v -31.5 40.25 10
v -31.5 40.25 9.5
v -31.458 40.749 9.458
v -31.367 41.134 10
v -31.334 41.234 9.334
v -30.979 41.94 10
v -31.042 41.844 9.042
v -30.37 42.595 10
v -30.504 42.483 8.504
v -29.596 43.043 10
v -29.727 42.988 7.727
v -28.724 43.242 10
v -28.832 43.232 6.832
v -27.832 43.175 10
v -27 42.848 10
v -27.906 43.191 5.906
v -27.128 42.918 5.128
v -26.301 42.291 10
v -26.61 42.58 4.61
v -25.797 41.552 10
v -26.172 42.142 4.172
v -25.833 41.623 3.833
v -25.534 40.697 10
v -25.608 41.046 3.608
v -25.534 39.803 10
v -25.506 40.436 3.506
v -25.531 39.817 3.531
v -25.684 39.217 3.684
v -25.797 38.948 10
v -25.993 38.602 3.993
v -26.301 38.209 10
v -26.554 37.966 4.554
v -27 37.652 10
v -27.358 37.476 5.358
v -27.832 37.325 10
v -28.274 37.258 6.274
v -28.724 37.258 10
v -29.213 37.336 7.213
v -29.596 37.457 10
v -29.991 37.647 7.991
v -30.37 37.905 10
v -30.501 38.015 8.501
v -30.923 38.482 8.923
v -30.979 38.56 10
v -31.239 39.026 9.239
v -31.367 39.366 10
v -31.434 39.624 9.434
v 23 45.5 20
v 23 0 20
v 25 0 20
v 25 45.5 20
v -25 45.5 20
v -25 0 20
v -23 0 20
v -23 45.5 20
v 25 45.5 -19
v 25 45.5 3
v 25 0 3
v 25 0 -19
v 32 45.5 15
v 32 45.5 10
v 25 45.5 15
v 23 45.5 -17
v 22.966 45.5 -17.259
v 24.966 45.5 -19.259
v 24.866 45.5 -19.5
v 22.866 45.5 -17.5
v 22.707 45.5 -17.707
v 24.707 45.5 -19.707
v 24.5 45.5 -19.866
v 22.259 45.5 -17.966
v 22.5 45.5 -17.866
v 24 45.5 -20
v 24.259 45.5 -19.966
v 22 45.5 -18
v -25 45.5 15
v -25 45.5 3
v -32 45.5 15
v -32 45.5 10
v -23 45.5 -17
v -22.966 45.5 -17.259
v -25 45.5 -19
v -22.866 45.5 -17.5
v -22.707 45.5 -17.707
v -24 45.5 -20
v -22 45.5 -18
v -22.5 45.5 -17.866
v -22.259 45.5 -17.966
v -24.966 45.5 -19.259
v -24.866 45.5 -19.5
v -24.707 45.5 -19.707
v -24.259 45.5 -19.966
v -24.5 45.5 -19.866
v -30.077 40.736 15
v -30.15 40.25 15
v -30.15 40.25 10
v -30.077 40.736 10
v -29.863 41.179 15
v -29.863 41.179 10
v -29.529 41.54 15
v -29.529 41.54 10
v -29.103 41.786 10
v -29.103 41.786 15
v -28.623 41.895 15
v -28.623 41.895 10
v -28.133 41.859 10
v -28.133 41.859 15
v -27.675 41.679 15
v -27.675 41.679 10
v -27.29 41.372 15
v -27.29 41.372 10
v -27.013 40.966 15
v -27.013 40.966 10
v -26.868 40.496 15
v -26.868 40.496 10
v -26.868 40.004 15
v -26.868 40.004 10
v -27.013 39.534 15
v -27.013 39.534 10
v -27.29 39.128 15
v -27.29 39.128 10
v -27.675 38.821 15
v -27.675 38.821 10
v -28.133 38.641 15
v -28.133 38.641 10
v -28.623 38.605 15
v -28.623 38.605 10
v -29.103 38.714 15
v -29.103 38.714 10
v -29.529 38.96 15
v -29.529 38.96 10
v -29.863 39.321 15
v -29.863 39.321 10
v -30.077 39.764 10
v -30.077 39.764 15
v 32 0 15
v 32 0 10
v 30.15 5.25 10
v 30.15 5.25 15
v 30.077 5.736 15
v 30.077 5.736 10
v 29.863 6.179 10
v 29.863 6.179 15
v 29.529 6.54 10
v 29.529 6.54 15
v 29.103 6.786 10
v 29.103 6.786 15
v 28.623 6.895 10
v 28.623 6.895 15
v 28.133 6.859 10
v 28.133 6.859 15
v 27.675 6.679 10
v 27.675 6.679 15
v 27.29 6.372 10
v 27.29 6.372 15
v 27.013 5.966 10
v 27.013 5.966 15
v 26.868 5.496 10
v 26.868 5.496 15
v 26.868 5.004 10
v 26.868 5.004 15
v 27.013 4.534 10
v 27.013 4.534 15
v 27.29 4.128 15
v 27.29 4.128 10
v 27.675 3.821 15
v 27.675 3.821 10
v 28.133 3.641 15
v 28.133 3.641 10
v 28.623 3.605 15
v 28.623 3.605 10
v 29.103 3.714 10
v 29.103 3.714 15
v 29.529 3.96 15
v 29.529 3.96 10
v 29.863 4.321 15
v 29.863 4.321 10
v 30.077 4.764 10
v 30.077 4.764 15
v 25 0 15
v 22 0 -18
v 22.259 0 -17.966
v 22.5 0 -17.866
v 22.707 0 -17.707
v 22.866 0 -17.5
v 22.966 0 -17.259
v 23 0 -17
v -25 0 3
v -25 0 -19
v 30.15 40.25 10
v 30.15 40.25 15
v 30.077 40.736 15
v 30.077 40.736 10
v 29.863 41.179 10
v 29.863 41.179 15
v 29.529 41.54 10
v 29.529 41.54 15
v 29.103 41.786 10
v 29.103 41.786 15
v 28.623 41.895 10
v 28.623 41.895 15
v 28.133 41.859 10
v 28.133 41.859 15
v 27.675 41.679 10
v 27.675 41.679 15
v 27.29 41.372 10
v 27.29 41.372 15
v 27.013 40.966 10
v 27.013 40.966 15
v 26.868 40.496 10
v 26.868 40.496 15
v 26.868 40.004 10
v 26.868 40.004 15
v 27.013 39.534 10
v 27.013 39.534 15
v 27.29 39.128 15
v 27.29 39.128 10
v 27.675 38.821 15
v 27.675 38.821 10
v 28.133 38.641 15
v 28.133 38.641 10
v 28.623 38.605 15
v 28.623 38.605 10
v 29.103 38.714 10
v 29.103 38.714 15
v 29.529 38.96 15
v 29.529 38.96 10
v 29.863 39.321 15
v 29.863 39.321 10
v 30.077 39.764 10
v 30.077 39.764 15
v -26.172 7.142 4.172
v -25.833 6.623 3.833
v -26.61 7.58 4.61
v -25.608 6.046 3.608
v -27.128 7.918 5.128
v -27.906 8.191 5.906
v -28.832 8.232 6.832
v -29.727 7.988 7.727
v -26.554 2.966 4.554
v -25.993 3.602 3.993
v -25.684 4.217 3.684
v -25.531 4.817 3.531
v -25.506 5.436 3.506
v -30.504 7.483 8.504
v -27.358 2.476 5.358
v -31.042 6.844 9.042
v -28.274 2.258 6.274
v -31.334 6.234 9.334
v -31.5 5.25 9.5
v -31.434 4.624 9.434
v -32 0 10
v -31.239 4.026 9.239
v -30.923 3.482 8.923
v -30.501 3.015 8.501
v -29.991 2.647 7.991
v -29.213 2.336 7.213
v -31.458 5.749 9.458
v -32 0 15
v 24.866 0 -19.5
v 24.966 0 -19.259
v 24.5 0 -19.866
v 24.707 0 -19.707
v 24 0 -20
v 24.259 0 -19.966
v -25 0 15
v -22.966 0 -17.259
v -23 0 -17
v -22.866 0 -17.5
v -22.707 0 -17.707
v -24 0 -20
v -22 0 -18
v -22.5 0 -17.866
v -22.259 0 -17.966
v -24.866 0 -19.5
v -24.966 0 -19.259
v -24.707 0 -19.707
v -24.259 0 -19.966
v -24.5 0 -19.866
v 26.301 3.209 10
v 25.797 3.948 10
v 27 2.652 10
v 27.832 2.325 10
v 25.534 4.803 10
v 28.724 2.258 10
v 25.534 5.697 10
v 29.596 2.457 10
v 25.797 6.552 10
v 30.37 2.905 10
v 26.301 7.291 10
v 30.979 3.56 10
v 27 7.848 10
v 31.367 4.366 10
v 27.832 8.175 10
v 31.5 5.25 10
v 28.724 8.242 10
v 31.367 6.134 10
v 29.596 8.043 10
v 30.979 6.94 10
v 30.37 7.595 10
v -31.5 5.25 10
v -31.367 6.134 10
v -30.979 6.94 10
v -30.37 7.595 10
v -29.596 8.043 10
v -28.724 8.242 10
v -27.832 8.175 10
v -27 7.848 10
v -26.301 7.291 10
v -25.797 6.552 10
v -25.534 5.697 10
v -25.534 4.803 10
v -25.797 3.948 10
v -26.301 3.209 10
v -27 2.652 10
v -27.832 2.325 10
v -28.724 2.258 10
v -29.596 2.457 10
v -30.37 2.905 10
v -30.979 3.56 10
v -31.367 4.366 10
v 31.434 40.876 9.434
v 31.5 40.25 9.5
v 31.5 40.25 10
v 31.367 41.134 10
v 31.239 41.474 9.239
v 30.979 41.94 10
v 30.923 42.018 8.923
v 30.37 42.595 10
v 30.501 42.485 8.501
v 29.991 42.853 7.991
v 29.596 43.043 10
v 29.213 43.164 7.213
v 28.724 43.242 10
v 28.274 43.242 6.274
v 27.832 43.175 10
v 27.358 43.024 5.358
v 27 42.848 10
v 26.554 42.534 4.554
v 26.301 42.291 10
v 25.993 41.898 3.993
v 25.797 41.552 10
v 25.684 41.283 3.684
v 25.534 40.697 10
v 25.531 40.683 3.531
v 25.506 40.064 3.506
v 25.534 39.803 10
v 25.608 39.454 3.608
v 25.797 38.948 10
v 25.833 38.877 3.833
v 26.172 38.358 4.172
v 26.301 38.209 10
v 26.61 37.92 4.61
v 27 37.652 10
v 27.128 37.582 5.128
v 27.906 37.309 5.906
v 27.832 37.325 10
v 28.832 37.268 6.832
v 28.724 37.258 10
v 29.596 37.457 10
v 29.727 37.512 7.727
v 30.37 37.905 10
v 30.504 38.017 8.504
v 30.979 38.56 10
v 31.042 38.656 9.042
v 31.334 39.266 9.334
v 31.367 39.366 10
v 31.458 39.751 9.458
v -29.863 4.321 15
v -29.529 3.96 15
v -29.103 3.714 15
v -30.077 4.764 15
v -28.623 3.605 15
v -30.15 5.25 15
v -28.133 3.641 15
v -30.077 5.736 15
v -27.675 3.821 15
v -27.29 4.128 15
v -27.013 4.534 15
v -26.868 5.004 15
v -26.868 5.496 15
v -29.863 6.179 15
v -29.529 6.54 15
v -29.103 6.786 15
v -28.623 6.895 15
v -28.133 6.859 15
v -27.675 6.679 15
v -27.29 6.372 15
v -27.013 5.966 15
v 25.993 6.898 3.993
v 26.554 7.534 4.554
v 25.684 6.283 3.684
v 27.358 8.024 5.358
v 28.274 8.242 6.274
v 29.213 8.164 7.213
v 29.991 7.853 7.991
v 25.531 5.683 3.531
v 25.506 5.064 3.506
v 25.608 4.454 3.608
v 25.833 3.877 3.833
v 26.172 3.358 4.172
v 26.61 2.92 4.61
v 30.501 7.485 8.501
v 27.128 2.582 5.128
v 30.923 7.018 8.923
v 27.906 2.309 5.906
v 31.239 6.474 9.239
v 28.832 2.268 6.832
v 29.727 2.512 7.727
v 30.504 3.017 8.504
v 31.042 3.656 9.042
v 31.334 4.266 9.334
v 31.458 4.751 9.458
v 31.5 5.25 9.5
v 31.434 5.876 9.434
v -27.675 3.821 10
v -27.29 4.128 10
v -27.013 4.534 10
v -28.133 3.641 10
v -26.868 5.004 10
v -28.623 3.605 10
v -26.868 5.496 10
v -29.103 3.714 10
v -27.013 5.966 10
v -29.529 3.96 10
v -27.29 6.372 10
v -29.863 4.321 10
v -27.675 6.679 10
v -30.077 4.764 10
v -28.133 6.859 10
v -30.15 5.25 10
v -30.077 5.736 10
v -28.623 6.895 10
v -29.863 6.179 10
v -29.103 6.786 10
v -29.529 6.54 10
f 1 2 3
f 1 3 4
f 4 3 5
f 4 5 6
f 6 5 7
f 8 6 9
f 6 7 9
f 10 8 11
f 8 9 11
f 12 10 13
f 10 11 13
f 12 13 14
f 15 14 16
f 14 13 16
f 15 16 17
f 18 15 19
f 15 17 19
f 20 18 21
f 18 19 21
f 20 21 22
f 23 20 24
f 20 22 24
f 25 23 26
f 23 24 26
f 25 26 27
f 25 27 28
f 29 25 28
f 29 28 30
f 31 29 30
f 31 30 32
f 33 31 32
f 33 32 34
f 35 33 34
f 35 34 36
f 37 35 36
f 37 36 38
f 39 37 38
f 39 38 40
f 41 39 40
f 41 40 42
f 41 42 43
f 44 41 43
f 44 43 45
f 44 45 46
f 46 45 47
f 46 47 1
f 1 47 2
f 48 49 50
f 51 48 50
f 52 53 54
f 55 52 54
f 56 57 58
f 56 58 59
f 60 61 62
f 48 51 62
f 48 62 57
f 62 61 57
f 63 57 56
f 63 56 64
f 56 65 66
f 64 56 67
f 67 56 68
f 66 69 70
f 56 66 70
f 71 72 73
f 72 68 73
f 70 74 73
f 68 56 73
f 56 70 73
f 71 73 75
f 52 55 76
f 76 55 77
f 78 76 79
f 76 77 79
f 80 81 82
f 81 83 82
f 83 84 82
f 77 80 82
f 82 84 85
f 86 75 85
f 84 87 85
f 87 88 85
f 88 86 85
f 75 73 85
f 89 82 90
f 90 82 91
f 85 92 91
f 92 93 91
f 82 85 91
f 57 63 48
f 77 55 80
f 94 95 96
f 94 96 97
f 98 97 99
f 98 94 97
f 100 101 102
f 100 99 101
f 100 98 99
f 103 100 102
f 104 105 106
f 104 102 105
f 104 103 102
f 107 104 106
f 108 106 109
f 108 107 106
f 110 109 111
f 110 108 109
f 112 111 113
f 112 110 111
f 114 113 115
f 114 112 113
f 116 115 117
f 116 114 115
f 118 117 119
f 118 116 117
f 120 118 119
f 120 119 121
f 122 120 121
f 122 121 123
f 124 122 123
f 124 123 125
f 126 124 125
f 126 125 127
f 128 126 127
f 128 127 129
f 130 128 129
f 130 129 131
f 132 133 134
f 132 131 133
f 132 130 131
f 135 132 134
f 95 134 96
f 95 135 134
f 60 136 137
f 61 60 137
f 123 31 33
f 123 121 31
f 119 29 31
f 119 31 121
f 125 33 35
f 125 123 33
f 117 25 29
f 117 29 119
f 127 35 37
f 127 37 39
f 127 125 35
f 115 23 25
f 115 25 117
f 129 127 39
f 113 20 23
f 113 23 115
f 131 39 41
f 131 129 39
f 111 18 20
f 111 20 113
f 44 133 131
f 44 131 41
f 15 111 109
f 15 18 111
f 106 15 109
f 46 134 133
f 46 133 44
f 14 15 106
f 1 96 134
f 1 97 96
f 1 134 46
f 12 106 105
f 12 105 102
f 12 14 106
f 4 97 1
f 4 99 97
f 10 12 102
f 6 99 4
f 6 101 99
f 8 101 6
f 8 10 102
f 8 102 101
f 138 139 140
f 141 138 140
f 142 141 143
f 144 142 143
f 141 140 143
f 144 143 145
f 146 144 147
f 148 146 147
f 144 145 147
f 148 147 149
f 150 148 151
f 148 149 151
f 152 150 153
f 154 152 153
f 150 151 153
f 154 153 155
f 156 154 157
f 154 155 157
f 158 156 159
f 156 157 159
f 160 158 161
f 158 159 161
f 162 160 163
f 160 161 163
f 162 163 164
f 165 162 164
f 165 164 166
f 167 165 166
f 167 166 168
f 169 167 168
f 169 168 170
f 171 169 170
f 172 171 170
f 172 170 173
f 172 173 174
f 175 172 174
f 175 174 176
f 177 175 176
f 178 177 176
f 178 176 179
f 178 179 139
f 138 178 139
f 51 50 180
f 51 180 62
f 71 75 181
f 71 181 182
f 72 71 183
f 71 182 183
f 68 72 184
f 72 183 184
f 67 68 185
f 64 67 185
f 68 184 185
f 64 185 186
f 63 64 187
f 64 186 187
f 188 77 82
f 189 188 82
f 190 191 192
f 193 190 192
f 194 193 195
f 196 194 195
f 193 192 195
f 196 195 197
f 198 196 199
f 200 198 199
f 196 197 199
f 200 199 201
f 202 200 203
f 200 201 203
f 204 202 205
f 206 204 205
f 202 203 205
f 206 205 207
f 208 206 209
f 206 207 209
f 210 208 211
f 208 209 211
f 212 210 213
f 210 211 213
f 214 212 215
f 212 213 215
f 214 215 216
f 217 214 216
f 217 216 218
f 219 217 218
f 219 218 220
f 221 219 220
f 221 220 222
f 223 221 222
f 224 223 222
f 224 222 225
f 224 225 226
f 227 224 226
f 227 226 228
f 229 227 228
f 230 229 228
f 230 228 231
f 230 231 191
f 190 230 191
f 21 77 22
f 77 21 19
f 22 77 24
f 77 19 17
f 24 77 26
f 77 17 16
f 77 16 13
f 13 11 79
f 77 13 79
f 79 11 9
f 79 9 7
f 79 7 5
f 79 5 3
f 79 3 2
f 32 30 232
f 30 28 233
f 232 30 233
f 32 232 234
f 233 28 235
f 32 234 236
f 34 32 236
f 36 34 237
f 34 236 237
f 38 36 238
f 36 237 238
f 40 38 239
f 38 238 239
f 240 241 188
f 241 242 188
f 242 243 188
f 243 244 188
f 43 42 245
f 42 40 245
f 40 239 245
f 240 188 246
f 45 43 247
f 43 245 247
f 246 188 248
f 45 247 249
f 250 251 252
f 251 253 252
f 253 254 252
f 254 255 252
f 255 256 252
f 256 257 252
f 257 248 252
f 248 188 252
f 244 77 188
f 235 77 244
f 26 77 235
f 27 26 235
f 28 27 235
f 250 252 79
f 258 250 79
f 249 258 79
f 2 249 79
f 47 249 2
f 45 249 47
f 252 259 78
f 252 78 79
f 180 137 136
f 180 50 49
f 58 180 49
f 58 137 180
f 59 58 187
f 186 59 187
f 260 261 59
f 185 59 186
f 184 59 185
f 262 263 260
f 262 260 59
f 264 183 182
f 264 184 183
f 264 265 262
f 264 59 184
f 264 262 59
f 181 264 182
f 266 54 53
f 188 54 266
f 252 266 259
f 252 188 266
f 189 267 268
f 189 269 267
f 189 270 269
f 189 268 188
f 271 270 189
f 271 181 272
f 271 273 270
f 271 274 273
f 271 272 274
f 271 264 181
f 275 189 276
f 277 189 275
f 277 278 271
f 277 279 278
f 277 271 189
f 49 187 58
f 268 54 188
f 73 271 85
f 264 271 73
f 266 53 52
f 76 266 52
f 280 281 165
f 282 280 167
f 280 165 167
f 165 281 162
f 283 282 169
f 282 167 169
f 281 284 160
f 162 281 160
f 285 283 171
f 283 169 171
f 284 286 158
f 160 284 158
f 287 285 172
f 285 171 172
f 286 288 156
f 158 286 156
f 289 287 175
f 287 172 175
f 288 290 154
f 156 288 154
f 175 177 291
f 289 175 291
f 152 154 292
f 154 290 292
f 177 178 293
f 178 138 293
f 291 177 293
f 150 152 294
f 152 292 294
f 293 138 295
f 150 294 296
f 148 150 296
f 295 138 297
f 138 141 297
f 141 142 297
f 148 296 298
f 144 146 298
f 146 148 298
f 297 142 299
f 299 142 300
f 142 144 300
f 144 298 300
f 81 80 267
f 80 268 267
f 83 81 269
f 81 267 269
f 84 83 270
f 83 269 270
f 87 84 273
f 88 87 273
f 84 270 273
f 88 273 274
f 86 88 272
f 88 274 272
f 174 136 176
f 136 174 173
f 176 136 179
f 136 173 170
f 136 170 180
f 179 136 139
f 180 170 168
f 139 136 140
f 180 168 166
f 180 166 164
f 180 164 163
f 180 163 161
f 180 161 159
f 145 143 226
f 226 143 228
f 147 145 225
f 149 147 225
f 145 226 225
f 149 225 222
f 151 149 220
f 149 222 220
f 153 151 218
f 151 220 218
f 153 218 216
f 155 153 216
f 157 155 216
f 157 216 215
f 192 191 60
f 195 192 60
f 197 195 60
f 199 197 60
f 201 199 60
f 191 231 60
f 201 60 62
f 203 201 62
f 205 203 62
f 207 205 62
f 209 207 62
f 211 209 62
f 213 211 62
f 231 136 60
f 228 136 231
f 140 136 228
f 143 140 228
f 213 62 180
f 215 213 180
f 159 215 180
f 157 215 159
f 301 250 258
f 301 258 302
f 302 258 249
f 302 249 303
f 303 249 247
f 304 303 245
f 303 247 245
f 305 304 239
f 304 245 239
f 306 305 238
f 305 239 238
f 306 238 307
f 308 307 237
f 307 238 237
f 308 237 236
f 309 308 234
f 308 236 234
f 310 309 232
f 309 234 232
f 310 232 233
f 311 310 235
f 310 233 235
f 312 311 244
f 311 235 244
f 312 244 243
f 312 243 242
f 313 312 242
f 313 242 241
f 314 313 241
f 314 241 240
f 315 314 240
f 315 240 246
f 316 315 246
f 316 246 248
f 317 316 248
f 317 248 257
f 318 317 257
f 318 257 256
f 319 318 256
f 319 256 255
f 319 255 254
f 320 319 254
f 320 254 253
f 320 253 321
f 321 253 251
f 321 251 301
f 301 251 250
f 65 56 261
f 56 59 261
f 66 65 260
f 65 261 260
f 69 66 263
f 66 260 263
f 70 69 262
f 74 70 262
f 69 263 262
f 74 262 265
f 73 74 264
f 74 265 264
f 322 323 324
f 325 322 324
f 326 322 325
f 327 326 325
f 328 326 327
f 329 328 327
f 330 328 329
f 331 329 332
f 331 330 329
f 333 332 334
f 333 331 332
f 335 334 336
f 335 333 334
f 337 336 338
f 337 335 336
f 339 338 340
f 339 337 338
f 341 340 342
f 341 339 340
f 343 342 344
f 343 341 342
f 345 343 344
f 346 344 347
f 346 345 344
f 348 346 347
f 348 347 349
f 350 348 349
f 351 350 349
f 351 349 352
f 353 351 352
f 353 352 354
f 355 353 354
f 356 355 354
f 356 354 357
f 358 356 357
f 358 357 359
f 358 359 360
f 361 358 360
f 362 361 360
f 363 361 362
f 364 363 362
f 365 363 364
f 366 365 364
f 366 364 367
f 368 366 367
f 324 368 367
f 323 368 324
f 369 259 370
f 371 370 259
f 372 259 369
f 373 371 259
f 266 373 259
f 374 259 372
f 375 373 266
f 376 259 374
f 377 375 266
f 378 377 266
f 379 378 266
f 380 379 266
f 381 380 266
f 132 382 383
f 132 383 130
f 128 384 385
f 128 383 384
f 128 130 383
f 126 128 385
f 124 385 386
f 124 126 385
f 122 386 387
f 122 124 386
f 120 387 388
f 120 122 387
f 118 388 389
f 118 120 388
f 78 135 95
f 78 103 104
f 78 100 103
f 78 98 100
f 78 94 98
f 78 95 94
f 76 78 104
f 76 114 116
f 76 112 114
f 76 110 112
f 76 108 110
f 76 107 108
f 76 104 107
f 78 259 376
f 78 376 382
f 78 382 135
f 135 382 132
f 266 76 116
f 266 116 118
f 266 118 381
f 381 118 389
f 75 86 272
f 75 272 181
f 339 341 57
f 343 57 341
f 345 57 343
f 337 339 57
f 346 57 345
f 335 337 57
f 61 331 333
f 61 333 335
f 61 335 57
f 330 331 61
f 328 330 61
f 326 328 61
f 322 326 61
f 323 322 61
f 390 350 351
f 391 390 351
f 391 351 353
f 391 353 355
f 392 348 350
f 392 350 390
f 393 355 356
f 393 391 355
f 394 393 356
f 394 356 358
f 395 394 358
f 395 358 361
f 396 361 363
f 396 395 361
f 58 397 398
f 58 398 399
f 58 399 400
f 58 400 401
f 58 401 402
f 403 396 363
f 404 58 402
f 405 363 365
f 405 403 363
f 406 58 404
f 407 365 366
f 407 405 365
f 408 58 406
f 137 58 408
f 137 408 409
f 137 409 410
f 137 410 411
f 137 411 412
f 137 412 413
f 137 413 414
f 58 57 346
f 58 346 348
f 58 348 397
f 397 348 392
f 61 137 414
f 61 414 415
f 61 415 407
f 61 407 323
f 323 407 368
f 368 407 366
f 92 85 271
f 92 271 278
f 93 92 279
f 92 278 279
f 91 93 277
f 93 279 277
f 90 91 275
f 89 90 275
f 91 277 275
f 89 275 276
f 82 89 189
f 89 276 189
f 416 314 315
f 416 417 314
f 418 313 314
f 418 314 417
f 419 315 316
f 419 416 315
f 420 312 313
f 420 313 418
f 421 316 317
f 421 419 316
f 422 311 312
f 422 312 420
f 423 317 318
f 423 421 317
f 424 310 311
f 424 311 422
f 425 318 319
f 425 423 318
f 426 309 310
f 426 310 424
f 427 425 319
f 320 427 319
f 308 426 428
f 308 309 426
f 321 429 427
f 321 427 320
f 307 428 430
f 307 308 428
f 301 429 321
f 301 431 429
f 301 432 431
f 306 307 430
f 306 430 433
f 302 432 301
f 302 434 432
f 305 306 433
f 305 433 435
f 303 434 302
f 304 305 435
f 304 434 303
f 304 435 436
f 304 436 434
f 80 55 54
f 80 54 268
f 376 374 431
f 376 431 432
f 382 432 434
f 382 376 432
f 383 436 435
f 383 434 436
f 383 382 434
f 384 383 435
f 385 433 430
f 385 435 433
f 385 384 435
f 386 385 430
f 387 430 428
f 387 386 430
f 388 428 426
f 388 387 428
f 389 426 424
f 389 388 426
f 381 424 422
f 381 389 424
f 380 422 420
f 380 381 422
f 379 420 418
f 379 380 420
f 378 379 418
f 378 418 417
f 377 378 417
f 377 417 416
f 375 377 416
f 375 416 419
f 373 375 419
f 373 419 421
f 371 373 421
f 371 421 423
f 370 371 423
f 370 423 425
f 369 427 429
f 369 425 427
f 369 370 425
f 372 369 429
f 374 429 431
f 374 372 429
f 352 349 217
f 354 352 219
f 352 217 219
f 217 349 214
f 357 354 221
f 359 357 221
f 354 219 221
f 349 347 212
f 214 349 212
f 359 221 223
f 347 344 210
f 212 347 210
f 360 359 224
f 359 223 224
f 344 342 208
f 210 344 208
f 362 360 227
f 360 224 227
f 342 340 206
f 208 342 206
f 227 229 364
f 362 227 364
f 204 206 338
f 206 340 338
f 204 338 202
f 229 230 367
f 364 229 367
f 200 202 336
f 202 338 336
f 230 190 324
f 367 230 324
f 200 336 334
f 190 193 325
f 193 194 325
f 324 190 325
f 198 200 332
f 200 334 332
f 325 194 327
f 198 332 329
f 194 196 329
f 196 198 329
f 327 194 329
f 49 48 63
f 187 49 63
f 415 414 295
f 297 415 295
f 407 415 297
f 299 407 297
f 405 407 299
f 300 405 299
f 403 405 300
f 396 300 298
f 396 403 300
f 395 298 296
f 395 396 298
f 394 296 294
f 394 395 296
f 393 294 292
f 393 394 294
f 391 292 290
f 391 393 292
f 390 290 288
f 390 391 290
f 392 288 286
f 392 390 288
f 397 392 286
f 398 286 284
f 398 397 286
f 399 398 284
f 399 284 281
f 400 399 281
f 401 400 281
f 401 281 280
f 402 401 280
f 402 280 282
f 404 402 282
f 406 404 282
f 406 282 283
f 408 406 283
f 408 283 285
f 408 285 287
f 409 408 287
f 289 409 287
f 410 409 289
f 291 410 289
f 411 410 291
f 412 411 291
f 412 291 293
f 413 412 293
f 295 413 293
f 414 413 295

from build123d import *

# Parameters (mm, degrees)
SKETCH_1_W          = 64
SKETCH_1_H          = 40
EXTRUDE_1_DEPTH     = 45.5
CUT_EXTRUDE_1_REACH = 61.112
SKETCH_2_W          = 46
SKETCH_2_H          = 38
CUT_EXTRUDE_2_REACH = 61.112
SKETCH_3_W          = 7
SKETCH_3_H          = 30
EXTRUDE_2_DEPTH     = 45.5
CUT_EXTRUDE_3_REACH = 70.515
SKETCH_4_R          = 1.65
SKETCH_7_R          = 3
CUT_EXTRUDE_4_DEPTH = 30
SKETCH_8_W          = 7
SKETCH_8_H          = 45.5
CUT_EXTRUDE_5_DEPTH = 5
FILLET_1_R          = 1


with BuildPart() as part:
    # 草图1 → 凸台-拉伸1 (new body)
    with BuildSketch(Plane(origin=(0, 0, 0), x_dir=(1, 0, 0), z_dir=(0, 1, 0))):
        Rectangle(SKETCH_1_W, SKETCH_1_H)
    extrude(amount=EXTRUDE_1_DEPTH)

    # 草图2 → 切除-拉伸1 (cut, up to next)
    with BuildSketch(Plane(origin=(0, 45.5, 0), x_dir=(1, 0, 0), z_dir=(0, 1, 0)), mode=Mode.PRIVATE) as cut_extrude_1_sk1:
        with Locations((0, -1)):
            Rectangle(SKETCH_2_W, SKETCH_2_H)
    cut_extrude_1_tool1 = extrude(cut_extrude_1_sk1.sketch, amount=-CUT_EXTRUDE_1_REACH, mode=Mode.PRIVATE) & part.part
    add(cut_extrude_1_tool1.solids().sort_by_distance((0, 45.5, 1))[0], mode=Mode.SUBTRACT)

    # 草图3 → 切除-拉伸2 (cut, up to next)
    with BuildSketch(Plane(origin=(0, 45.5, 0), x_dir=(1, 0, 0), z_dir=(0, 1, 0)), mode=Mode.PRIVATE) as cut_extrude_2_sk1:
        with Locations((-28.5, 5)):
            Rectangle(SKETCH_3_W, SKETCH_3_H)
    cut_extrude_2_tool1 = extrude(cut_extrude_2_sk1.sketch, amount=-CUT_EXTRUDE_2_REACH, mode=Mode.PRIVATE) & part.part
    cut_extrude_2 = cut_extrude_2_tool1.solids().sort_by_distance((-28.5, 45.5, -5))[0]
    add(cut_extrude_2, mode=Mode.SUBTRACT)

    # 草图6 → 凸台-拉伸2 (add)
    with BuildSketch(Plane(origin=(0, 0, 0), x_dir=(1, 0, 0), z_dir=(0, 1, 0))):
        Polygon((-32, -10), (-25, -10), (-25, -3), align=None)
    extrude_2 = extrude(amount=EXTRUDE_2_DEPTH)

    # 切除-拉伸3: up to this plane
    cut_extrude_3_end = Plane(origin=(-25, 55.399494937, 3), z_dir=(0.7071067811865438, 0, 0.7071067811865512))
    # 草图4 → 切除-拉伸3 (cut, up to the surface)
    with BuildSketch(Plane(origin=(0, 0, 20), x_dir=(-1, 0, 0), z_dir=(0, 0, -1)), mode=Mode.PRIVATE) as cut_extrude_3_sk1:
        with Locations((28.5, 40.25)):
            Circle(SKETCH_4_R)
    cut_extrude_3_tool1 = split(extrude(cut_extrude_3_sk1.sketch, amount=CUT_EXTRUDE_3_REACH, mode=Mode.PRIVATE), bisect_by=cut_extrude_3_end, keep=Keep.BOTH, mode=Mode.PRIVATE)
    # 草图4 → 切除-拉伸3 (cut, up to the surface)
    with BuildSketch(Plane(origin=(0, 0, 20), x_dir=(-1, 0, 0), z_dir=(0, 0, -1)), mode=Mode.PRIVATE) as cut_extrude_3_sk2:
        with Locations((28.5, 5.25)):
            Circle(SKETCH_4_R)
    cut_extrude_3_tool2 = split(extrude(cut_extrude_3_sk2.sketch, amount=CUT_EXTRUDE_3_REACH, mode=Mode.PRIVATE), bisect_by=cut_extrude_3_end, keep=Keep.BOTH, mode=Mode.PRIVATE)
    cut_extrude_3 = cut_extrude_3_tool1.solids().sort_by_distance((-28.5, 40.25, 20))[0] + cut_extrude_3_tool2.solids().sort_by_distance((-28.5, 5.25, 20))[0]
    add(cut_extrude_3, mode=Mode.SUBTRACT)

    # 草图7 → 切除-拉伸4 (cut)
    with BuildSketch(Plane(origin=(0, 0, -20), x_dir=(-1, 0, 0), z_dir=(0, 0, -1))):
        with Locations((28.5, 40.25)):
            Circle(SKETCH_7_R)
        with Locations((28.5, 5.25)):
            Circle(SKETCH_7_R)
    cut_extrude_4 = extrude(amount=-CUT_EXTRUDE_4_DEPTH, mode=Mode.SUBTRACT)

    # 草图8 → 切除-拉伸5 (cut)
    with BuildSketch(Plane.XY.offset(20)):
        with Locations((-28.5, 22.75)):
            Rectangle(SKETCH_8_W, SKETCH_8_H)
    cut_extrude_5 = extrude(amount=-CUT_EXTRUDE_5_DEPTH, mode=Mode.SUBTRACT)

    # 镜向1: 切除-拉伸2, 凸台-拉伸2, 切除-拉伸3, 切除-拉伸4, 切除-拉伸5 across plane
    add(cut_extrude_2.mirror(Plane(origin=(0, 0, 0), x_dir=(0, 0, 1), z_dir=(1, 0, 0))), mode=Mode.SUBTRACT)
    add(extrude_2.mirror(Plane(origin=(0, 0, 0), x_dir=(0, 0, 1), z_dir=(1, 0, 0))))
    add(cut_extrude_3.mirror(Plane(origin=(0, 0, 0), x_dir=(0, 0, 1), z_dir=(1, 0, 0))), mode=Mode.SUBTRACT)
    add(cut_extrude_4.mirror(Plane(origin=(0, 0, 0), x_dir=(0, 0, 1), z_dir=(1, 0, 0))), mode=Mode.SUBTRACT)
    add(cut_extrude_5.mirror(Plane(origin=(0, 0, 0), x_dir=(0, 0, 1), z_dir=(1, 0, 0))), mode=Mode.SUBTRACT)

    # 圆角1
    fillet_1_edges = [part.edges().sort_by_distance(p)[0] for p in [
        (-23, 22.75, -18),
        (23, 22.75, -18),
        (-25, 22.75, -20),
        (25, 22.75, -20),
    ]]
    fillet(fillet_1_edges, radius=FILLET_1_R)


solid = part.part
